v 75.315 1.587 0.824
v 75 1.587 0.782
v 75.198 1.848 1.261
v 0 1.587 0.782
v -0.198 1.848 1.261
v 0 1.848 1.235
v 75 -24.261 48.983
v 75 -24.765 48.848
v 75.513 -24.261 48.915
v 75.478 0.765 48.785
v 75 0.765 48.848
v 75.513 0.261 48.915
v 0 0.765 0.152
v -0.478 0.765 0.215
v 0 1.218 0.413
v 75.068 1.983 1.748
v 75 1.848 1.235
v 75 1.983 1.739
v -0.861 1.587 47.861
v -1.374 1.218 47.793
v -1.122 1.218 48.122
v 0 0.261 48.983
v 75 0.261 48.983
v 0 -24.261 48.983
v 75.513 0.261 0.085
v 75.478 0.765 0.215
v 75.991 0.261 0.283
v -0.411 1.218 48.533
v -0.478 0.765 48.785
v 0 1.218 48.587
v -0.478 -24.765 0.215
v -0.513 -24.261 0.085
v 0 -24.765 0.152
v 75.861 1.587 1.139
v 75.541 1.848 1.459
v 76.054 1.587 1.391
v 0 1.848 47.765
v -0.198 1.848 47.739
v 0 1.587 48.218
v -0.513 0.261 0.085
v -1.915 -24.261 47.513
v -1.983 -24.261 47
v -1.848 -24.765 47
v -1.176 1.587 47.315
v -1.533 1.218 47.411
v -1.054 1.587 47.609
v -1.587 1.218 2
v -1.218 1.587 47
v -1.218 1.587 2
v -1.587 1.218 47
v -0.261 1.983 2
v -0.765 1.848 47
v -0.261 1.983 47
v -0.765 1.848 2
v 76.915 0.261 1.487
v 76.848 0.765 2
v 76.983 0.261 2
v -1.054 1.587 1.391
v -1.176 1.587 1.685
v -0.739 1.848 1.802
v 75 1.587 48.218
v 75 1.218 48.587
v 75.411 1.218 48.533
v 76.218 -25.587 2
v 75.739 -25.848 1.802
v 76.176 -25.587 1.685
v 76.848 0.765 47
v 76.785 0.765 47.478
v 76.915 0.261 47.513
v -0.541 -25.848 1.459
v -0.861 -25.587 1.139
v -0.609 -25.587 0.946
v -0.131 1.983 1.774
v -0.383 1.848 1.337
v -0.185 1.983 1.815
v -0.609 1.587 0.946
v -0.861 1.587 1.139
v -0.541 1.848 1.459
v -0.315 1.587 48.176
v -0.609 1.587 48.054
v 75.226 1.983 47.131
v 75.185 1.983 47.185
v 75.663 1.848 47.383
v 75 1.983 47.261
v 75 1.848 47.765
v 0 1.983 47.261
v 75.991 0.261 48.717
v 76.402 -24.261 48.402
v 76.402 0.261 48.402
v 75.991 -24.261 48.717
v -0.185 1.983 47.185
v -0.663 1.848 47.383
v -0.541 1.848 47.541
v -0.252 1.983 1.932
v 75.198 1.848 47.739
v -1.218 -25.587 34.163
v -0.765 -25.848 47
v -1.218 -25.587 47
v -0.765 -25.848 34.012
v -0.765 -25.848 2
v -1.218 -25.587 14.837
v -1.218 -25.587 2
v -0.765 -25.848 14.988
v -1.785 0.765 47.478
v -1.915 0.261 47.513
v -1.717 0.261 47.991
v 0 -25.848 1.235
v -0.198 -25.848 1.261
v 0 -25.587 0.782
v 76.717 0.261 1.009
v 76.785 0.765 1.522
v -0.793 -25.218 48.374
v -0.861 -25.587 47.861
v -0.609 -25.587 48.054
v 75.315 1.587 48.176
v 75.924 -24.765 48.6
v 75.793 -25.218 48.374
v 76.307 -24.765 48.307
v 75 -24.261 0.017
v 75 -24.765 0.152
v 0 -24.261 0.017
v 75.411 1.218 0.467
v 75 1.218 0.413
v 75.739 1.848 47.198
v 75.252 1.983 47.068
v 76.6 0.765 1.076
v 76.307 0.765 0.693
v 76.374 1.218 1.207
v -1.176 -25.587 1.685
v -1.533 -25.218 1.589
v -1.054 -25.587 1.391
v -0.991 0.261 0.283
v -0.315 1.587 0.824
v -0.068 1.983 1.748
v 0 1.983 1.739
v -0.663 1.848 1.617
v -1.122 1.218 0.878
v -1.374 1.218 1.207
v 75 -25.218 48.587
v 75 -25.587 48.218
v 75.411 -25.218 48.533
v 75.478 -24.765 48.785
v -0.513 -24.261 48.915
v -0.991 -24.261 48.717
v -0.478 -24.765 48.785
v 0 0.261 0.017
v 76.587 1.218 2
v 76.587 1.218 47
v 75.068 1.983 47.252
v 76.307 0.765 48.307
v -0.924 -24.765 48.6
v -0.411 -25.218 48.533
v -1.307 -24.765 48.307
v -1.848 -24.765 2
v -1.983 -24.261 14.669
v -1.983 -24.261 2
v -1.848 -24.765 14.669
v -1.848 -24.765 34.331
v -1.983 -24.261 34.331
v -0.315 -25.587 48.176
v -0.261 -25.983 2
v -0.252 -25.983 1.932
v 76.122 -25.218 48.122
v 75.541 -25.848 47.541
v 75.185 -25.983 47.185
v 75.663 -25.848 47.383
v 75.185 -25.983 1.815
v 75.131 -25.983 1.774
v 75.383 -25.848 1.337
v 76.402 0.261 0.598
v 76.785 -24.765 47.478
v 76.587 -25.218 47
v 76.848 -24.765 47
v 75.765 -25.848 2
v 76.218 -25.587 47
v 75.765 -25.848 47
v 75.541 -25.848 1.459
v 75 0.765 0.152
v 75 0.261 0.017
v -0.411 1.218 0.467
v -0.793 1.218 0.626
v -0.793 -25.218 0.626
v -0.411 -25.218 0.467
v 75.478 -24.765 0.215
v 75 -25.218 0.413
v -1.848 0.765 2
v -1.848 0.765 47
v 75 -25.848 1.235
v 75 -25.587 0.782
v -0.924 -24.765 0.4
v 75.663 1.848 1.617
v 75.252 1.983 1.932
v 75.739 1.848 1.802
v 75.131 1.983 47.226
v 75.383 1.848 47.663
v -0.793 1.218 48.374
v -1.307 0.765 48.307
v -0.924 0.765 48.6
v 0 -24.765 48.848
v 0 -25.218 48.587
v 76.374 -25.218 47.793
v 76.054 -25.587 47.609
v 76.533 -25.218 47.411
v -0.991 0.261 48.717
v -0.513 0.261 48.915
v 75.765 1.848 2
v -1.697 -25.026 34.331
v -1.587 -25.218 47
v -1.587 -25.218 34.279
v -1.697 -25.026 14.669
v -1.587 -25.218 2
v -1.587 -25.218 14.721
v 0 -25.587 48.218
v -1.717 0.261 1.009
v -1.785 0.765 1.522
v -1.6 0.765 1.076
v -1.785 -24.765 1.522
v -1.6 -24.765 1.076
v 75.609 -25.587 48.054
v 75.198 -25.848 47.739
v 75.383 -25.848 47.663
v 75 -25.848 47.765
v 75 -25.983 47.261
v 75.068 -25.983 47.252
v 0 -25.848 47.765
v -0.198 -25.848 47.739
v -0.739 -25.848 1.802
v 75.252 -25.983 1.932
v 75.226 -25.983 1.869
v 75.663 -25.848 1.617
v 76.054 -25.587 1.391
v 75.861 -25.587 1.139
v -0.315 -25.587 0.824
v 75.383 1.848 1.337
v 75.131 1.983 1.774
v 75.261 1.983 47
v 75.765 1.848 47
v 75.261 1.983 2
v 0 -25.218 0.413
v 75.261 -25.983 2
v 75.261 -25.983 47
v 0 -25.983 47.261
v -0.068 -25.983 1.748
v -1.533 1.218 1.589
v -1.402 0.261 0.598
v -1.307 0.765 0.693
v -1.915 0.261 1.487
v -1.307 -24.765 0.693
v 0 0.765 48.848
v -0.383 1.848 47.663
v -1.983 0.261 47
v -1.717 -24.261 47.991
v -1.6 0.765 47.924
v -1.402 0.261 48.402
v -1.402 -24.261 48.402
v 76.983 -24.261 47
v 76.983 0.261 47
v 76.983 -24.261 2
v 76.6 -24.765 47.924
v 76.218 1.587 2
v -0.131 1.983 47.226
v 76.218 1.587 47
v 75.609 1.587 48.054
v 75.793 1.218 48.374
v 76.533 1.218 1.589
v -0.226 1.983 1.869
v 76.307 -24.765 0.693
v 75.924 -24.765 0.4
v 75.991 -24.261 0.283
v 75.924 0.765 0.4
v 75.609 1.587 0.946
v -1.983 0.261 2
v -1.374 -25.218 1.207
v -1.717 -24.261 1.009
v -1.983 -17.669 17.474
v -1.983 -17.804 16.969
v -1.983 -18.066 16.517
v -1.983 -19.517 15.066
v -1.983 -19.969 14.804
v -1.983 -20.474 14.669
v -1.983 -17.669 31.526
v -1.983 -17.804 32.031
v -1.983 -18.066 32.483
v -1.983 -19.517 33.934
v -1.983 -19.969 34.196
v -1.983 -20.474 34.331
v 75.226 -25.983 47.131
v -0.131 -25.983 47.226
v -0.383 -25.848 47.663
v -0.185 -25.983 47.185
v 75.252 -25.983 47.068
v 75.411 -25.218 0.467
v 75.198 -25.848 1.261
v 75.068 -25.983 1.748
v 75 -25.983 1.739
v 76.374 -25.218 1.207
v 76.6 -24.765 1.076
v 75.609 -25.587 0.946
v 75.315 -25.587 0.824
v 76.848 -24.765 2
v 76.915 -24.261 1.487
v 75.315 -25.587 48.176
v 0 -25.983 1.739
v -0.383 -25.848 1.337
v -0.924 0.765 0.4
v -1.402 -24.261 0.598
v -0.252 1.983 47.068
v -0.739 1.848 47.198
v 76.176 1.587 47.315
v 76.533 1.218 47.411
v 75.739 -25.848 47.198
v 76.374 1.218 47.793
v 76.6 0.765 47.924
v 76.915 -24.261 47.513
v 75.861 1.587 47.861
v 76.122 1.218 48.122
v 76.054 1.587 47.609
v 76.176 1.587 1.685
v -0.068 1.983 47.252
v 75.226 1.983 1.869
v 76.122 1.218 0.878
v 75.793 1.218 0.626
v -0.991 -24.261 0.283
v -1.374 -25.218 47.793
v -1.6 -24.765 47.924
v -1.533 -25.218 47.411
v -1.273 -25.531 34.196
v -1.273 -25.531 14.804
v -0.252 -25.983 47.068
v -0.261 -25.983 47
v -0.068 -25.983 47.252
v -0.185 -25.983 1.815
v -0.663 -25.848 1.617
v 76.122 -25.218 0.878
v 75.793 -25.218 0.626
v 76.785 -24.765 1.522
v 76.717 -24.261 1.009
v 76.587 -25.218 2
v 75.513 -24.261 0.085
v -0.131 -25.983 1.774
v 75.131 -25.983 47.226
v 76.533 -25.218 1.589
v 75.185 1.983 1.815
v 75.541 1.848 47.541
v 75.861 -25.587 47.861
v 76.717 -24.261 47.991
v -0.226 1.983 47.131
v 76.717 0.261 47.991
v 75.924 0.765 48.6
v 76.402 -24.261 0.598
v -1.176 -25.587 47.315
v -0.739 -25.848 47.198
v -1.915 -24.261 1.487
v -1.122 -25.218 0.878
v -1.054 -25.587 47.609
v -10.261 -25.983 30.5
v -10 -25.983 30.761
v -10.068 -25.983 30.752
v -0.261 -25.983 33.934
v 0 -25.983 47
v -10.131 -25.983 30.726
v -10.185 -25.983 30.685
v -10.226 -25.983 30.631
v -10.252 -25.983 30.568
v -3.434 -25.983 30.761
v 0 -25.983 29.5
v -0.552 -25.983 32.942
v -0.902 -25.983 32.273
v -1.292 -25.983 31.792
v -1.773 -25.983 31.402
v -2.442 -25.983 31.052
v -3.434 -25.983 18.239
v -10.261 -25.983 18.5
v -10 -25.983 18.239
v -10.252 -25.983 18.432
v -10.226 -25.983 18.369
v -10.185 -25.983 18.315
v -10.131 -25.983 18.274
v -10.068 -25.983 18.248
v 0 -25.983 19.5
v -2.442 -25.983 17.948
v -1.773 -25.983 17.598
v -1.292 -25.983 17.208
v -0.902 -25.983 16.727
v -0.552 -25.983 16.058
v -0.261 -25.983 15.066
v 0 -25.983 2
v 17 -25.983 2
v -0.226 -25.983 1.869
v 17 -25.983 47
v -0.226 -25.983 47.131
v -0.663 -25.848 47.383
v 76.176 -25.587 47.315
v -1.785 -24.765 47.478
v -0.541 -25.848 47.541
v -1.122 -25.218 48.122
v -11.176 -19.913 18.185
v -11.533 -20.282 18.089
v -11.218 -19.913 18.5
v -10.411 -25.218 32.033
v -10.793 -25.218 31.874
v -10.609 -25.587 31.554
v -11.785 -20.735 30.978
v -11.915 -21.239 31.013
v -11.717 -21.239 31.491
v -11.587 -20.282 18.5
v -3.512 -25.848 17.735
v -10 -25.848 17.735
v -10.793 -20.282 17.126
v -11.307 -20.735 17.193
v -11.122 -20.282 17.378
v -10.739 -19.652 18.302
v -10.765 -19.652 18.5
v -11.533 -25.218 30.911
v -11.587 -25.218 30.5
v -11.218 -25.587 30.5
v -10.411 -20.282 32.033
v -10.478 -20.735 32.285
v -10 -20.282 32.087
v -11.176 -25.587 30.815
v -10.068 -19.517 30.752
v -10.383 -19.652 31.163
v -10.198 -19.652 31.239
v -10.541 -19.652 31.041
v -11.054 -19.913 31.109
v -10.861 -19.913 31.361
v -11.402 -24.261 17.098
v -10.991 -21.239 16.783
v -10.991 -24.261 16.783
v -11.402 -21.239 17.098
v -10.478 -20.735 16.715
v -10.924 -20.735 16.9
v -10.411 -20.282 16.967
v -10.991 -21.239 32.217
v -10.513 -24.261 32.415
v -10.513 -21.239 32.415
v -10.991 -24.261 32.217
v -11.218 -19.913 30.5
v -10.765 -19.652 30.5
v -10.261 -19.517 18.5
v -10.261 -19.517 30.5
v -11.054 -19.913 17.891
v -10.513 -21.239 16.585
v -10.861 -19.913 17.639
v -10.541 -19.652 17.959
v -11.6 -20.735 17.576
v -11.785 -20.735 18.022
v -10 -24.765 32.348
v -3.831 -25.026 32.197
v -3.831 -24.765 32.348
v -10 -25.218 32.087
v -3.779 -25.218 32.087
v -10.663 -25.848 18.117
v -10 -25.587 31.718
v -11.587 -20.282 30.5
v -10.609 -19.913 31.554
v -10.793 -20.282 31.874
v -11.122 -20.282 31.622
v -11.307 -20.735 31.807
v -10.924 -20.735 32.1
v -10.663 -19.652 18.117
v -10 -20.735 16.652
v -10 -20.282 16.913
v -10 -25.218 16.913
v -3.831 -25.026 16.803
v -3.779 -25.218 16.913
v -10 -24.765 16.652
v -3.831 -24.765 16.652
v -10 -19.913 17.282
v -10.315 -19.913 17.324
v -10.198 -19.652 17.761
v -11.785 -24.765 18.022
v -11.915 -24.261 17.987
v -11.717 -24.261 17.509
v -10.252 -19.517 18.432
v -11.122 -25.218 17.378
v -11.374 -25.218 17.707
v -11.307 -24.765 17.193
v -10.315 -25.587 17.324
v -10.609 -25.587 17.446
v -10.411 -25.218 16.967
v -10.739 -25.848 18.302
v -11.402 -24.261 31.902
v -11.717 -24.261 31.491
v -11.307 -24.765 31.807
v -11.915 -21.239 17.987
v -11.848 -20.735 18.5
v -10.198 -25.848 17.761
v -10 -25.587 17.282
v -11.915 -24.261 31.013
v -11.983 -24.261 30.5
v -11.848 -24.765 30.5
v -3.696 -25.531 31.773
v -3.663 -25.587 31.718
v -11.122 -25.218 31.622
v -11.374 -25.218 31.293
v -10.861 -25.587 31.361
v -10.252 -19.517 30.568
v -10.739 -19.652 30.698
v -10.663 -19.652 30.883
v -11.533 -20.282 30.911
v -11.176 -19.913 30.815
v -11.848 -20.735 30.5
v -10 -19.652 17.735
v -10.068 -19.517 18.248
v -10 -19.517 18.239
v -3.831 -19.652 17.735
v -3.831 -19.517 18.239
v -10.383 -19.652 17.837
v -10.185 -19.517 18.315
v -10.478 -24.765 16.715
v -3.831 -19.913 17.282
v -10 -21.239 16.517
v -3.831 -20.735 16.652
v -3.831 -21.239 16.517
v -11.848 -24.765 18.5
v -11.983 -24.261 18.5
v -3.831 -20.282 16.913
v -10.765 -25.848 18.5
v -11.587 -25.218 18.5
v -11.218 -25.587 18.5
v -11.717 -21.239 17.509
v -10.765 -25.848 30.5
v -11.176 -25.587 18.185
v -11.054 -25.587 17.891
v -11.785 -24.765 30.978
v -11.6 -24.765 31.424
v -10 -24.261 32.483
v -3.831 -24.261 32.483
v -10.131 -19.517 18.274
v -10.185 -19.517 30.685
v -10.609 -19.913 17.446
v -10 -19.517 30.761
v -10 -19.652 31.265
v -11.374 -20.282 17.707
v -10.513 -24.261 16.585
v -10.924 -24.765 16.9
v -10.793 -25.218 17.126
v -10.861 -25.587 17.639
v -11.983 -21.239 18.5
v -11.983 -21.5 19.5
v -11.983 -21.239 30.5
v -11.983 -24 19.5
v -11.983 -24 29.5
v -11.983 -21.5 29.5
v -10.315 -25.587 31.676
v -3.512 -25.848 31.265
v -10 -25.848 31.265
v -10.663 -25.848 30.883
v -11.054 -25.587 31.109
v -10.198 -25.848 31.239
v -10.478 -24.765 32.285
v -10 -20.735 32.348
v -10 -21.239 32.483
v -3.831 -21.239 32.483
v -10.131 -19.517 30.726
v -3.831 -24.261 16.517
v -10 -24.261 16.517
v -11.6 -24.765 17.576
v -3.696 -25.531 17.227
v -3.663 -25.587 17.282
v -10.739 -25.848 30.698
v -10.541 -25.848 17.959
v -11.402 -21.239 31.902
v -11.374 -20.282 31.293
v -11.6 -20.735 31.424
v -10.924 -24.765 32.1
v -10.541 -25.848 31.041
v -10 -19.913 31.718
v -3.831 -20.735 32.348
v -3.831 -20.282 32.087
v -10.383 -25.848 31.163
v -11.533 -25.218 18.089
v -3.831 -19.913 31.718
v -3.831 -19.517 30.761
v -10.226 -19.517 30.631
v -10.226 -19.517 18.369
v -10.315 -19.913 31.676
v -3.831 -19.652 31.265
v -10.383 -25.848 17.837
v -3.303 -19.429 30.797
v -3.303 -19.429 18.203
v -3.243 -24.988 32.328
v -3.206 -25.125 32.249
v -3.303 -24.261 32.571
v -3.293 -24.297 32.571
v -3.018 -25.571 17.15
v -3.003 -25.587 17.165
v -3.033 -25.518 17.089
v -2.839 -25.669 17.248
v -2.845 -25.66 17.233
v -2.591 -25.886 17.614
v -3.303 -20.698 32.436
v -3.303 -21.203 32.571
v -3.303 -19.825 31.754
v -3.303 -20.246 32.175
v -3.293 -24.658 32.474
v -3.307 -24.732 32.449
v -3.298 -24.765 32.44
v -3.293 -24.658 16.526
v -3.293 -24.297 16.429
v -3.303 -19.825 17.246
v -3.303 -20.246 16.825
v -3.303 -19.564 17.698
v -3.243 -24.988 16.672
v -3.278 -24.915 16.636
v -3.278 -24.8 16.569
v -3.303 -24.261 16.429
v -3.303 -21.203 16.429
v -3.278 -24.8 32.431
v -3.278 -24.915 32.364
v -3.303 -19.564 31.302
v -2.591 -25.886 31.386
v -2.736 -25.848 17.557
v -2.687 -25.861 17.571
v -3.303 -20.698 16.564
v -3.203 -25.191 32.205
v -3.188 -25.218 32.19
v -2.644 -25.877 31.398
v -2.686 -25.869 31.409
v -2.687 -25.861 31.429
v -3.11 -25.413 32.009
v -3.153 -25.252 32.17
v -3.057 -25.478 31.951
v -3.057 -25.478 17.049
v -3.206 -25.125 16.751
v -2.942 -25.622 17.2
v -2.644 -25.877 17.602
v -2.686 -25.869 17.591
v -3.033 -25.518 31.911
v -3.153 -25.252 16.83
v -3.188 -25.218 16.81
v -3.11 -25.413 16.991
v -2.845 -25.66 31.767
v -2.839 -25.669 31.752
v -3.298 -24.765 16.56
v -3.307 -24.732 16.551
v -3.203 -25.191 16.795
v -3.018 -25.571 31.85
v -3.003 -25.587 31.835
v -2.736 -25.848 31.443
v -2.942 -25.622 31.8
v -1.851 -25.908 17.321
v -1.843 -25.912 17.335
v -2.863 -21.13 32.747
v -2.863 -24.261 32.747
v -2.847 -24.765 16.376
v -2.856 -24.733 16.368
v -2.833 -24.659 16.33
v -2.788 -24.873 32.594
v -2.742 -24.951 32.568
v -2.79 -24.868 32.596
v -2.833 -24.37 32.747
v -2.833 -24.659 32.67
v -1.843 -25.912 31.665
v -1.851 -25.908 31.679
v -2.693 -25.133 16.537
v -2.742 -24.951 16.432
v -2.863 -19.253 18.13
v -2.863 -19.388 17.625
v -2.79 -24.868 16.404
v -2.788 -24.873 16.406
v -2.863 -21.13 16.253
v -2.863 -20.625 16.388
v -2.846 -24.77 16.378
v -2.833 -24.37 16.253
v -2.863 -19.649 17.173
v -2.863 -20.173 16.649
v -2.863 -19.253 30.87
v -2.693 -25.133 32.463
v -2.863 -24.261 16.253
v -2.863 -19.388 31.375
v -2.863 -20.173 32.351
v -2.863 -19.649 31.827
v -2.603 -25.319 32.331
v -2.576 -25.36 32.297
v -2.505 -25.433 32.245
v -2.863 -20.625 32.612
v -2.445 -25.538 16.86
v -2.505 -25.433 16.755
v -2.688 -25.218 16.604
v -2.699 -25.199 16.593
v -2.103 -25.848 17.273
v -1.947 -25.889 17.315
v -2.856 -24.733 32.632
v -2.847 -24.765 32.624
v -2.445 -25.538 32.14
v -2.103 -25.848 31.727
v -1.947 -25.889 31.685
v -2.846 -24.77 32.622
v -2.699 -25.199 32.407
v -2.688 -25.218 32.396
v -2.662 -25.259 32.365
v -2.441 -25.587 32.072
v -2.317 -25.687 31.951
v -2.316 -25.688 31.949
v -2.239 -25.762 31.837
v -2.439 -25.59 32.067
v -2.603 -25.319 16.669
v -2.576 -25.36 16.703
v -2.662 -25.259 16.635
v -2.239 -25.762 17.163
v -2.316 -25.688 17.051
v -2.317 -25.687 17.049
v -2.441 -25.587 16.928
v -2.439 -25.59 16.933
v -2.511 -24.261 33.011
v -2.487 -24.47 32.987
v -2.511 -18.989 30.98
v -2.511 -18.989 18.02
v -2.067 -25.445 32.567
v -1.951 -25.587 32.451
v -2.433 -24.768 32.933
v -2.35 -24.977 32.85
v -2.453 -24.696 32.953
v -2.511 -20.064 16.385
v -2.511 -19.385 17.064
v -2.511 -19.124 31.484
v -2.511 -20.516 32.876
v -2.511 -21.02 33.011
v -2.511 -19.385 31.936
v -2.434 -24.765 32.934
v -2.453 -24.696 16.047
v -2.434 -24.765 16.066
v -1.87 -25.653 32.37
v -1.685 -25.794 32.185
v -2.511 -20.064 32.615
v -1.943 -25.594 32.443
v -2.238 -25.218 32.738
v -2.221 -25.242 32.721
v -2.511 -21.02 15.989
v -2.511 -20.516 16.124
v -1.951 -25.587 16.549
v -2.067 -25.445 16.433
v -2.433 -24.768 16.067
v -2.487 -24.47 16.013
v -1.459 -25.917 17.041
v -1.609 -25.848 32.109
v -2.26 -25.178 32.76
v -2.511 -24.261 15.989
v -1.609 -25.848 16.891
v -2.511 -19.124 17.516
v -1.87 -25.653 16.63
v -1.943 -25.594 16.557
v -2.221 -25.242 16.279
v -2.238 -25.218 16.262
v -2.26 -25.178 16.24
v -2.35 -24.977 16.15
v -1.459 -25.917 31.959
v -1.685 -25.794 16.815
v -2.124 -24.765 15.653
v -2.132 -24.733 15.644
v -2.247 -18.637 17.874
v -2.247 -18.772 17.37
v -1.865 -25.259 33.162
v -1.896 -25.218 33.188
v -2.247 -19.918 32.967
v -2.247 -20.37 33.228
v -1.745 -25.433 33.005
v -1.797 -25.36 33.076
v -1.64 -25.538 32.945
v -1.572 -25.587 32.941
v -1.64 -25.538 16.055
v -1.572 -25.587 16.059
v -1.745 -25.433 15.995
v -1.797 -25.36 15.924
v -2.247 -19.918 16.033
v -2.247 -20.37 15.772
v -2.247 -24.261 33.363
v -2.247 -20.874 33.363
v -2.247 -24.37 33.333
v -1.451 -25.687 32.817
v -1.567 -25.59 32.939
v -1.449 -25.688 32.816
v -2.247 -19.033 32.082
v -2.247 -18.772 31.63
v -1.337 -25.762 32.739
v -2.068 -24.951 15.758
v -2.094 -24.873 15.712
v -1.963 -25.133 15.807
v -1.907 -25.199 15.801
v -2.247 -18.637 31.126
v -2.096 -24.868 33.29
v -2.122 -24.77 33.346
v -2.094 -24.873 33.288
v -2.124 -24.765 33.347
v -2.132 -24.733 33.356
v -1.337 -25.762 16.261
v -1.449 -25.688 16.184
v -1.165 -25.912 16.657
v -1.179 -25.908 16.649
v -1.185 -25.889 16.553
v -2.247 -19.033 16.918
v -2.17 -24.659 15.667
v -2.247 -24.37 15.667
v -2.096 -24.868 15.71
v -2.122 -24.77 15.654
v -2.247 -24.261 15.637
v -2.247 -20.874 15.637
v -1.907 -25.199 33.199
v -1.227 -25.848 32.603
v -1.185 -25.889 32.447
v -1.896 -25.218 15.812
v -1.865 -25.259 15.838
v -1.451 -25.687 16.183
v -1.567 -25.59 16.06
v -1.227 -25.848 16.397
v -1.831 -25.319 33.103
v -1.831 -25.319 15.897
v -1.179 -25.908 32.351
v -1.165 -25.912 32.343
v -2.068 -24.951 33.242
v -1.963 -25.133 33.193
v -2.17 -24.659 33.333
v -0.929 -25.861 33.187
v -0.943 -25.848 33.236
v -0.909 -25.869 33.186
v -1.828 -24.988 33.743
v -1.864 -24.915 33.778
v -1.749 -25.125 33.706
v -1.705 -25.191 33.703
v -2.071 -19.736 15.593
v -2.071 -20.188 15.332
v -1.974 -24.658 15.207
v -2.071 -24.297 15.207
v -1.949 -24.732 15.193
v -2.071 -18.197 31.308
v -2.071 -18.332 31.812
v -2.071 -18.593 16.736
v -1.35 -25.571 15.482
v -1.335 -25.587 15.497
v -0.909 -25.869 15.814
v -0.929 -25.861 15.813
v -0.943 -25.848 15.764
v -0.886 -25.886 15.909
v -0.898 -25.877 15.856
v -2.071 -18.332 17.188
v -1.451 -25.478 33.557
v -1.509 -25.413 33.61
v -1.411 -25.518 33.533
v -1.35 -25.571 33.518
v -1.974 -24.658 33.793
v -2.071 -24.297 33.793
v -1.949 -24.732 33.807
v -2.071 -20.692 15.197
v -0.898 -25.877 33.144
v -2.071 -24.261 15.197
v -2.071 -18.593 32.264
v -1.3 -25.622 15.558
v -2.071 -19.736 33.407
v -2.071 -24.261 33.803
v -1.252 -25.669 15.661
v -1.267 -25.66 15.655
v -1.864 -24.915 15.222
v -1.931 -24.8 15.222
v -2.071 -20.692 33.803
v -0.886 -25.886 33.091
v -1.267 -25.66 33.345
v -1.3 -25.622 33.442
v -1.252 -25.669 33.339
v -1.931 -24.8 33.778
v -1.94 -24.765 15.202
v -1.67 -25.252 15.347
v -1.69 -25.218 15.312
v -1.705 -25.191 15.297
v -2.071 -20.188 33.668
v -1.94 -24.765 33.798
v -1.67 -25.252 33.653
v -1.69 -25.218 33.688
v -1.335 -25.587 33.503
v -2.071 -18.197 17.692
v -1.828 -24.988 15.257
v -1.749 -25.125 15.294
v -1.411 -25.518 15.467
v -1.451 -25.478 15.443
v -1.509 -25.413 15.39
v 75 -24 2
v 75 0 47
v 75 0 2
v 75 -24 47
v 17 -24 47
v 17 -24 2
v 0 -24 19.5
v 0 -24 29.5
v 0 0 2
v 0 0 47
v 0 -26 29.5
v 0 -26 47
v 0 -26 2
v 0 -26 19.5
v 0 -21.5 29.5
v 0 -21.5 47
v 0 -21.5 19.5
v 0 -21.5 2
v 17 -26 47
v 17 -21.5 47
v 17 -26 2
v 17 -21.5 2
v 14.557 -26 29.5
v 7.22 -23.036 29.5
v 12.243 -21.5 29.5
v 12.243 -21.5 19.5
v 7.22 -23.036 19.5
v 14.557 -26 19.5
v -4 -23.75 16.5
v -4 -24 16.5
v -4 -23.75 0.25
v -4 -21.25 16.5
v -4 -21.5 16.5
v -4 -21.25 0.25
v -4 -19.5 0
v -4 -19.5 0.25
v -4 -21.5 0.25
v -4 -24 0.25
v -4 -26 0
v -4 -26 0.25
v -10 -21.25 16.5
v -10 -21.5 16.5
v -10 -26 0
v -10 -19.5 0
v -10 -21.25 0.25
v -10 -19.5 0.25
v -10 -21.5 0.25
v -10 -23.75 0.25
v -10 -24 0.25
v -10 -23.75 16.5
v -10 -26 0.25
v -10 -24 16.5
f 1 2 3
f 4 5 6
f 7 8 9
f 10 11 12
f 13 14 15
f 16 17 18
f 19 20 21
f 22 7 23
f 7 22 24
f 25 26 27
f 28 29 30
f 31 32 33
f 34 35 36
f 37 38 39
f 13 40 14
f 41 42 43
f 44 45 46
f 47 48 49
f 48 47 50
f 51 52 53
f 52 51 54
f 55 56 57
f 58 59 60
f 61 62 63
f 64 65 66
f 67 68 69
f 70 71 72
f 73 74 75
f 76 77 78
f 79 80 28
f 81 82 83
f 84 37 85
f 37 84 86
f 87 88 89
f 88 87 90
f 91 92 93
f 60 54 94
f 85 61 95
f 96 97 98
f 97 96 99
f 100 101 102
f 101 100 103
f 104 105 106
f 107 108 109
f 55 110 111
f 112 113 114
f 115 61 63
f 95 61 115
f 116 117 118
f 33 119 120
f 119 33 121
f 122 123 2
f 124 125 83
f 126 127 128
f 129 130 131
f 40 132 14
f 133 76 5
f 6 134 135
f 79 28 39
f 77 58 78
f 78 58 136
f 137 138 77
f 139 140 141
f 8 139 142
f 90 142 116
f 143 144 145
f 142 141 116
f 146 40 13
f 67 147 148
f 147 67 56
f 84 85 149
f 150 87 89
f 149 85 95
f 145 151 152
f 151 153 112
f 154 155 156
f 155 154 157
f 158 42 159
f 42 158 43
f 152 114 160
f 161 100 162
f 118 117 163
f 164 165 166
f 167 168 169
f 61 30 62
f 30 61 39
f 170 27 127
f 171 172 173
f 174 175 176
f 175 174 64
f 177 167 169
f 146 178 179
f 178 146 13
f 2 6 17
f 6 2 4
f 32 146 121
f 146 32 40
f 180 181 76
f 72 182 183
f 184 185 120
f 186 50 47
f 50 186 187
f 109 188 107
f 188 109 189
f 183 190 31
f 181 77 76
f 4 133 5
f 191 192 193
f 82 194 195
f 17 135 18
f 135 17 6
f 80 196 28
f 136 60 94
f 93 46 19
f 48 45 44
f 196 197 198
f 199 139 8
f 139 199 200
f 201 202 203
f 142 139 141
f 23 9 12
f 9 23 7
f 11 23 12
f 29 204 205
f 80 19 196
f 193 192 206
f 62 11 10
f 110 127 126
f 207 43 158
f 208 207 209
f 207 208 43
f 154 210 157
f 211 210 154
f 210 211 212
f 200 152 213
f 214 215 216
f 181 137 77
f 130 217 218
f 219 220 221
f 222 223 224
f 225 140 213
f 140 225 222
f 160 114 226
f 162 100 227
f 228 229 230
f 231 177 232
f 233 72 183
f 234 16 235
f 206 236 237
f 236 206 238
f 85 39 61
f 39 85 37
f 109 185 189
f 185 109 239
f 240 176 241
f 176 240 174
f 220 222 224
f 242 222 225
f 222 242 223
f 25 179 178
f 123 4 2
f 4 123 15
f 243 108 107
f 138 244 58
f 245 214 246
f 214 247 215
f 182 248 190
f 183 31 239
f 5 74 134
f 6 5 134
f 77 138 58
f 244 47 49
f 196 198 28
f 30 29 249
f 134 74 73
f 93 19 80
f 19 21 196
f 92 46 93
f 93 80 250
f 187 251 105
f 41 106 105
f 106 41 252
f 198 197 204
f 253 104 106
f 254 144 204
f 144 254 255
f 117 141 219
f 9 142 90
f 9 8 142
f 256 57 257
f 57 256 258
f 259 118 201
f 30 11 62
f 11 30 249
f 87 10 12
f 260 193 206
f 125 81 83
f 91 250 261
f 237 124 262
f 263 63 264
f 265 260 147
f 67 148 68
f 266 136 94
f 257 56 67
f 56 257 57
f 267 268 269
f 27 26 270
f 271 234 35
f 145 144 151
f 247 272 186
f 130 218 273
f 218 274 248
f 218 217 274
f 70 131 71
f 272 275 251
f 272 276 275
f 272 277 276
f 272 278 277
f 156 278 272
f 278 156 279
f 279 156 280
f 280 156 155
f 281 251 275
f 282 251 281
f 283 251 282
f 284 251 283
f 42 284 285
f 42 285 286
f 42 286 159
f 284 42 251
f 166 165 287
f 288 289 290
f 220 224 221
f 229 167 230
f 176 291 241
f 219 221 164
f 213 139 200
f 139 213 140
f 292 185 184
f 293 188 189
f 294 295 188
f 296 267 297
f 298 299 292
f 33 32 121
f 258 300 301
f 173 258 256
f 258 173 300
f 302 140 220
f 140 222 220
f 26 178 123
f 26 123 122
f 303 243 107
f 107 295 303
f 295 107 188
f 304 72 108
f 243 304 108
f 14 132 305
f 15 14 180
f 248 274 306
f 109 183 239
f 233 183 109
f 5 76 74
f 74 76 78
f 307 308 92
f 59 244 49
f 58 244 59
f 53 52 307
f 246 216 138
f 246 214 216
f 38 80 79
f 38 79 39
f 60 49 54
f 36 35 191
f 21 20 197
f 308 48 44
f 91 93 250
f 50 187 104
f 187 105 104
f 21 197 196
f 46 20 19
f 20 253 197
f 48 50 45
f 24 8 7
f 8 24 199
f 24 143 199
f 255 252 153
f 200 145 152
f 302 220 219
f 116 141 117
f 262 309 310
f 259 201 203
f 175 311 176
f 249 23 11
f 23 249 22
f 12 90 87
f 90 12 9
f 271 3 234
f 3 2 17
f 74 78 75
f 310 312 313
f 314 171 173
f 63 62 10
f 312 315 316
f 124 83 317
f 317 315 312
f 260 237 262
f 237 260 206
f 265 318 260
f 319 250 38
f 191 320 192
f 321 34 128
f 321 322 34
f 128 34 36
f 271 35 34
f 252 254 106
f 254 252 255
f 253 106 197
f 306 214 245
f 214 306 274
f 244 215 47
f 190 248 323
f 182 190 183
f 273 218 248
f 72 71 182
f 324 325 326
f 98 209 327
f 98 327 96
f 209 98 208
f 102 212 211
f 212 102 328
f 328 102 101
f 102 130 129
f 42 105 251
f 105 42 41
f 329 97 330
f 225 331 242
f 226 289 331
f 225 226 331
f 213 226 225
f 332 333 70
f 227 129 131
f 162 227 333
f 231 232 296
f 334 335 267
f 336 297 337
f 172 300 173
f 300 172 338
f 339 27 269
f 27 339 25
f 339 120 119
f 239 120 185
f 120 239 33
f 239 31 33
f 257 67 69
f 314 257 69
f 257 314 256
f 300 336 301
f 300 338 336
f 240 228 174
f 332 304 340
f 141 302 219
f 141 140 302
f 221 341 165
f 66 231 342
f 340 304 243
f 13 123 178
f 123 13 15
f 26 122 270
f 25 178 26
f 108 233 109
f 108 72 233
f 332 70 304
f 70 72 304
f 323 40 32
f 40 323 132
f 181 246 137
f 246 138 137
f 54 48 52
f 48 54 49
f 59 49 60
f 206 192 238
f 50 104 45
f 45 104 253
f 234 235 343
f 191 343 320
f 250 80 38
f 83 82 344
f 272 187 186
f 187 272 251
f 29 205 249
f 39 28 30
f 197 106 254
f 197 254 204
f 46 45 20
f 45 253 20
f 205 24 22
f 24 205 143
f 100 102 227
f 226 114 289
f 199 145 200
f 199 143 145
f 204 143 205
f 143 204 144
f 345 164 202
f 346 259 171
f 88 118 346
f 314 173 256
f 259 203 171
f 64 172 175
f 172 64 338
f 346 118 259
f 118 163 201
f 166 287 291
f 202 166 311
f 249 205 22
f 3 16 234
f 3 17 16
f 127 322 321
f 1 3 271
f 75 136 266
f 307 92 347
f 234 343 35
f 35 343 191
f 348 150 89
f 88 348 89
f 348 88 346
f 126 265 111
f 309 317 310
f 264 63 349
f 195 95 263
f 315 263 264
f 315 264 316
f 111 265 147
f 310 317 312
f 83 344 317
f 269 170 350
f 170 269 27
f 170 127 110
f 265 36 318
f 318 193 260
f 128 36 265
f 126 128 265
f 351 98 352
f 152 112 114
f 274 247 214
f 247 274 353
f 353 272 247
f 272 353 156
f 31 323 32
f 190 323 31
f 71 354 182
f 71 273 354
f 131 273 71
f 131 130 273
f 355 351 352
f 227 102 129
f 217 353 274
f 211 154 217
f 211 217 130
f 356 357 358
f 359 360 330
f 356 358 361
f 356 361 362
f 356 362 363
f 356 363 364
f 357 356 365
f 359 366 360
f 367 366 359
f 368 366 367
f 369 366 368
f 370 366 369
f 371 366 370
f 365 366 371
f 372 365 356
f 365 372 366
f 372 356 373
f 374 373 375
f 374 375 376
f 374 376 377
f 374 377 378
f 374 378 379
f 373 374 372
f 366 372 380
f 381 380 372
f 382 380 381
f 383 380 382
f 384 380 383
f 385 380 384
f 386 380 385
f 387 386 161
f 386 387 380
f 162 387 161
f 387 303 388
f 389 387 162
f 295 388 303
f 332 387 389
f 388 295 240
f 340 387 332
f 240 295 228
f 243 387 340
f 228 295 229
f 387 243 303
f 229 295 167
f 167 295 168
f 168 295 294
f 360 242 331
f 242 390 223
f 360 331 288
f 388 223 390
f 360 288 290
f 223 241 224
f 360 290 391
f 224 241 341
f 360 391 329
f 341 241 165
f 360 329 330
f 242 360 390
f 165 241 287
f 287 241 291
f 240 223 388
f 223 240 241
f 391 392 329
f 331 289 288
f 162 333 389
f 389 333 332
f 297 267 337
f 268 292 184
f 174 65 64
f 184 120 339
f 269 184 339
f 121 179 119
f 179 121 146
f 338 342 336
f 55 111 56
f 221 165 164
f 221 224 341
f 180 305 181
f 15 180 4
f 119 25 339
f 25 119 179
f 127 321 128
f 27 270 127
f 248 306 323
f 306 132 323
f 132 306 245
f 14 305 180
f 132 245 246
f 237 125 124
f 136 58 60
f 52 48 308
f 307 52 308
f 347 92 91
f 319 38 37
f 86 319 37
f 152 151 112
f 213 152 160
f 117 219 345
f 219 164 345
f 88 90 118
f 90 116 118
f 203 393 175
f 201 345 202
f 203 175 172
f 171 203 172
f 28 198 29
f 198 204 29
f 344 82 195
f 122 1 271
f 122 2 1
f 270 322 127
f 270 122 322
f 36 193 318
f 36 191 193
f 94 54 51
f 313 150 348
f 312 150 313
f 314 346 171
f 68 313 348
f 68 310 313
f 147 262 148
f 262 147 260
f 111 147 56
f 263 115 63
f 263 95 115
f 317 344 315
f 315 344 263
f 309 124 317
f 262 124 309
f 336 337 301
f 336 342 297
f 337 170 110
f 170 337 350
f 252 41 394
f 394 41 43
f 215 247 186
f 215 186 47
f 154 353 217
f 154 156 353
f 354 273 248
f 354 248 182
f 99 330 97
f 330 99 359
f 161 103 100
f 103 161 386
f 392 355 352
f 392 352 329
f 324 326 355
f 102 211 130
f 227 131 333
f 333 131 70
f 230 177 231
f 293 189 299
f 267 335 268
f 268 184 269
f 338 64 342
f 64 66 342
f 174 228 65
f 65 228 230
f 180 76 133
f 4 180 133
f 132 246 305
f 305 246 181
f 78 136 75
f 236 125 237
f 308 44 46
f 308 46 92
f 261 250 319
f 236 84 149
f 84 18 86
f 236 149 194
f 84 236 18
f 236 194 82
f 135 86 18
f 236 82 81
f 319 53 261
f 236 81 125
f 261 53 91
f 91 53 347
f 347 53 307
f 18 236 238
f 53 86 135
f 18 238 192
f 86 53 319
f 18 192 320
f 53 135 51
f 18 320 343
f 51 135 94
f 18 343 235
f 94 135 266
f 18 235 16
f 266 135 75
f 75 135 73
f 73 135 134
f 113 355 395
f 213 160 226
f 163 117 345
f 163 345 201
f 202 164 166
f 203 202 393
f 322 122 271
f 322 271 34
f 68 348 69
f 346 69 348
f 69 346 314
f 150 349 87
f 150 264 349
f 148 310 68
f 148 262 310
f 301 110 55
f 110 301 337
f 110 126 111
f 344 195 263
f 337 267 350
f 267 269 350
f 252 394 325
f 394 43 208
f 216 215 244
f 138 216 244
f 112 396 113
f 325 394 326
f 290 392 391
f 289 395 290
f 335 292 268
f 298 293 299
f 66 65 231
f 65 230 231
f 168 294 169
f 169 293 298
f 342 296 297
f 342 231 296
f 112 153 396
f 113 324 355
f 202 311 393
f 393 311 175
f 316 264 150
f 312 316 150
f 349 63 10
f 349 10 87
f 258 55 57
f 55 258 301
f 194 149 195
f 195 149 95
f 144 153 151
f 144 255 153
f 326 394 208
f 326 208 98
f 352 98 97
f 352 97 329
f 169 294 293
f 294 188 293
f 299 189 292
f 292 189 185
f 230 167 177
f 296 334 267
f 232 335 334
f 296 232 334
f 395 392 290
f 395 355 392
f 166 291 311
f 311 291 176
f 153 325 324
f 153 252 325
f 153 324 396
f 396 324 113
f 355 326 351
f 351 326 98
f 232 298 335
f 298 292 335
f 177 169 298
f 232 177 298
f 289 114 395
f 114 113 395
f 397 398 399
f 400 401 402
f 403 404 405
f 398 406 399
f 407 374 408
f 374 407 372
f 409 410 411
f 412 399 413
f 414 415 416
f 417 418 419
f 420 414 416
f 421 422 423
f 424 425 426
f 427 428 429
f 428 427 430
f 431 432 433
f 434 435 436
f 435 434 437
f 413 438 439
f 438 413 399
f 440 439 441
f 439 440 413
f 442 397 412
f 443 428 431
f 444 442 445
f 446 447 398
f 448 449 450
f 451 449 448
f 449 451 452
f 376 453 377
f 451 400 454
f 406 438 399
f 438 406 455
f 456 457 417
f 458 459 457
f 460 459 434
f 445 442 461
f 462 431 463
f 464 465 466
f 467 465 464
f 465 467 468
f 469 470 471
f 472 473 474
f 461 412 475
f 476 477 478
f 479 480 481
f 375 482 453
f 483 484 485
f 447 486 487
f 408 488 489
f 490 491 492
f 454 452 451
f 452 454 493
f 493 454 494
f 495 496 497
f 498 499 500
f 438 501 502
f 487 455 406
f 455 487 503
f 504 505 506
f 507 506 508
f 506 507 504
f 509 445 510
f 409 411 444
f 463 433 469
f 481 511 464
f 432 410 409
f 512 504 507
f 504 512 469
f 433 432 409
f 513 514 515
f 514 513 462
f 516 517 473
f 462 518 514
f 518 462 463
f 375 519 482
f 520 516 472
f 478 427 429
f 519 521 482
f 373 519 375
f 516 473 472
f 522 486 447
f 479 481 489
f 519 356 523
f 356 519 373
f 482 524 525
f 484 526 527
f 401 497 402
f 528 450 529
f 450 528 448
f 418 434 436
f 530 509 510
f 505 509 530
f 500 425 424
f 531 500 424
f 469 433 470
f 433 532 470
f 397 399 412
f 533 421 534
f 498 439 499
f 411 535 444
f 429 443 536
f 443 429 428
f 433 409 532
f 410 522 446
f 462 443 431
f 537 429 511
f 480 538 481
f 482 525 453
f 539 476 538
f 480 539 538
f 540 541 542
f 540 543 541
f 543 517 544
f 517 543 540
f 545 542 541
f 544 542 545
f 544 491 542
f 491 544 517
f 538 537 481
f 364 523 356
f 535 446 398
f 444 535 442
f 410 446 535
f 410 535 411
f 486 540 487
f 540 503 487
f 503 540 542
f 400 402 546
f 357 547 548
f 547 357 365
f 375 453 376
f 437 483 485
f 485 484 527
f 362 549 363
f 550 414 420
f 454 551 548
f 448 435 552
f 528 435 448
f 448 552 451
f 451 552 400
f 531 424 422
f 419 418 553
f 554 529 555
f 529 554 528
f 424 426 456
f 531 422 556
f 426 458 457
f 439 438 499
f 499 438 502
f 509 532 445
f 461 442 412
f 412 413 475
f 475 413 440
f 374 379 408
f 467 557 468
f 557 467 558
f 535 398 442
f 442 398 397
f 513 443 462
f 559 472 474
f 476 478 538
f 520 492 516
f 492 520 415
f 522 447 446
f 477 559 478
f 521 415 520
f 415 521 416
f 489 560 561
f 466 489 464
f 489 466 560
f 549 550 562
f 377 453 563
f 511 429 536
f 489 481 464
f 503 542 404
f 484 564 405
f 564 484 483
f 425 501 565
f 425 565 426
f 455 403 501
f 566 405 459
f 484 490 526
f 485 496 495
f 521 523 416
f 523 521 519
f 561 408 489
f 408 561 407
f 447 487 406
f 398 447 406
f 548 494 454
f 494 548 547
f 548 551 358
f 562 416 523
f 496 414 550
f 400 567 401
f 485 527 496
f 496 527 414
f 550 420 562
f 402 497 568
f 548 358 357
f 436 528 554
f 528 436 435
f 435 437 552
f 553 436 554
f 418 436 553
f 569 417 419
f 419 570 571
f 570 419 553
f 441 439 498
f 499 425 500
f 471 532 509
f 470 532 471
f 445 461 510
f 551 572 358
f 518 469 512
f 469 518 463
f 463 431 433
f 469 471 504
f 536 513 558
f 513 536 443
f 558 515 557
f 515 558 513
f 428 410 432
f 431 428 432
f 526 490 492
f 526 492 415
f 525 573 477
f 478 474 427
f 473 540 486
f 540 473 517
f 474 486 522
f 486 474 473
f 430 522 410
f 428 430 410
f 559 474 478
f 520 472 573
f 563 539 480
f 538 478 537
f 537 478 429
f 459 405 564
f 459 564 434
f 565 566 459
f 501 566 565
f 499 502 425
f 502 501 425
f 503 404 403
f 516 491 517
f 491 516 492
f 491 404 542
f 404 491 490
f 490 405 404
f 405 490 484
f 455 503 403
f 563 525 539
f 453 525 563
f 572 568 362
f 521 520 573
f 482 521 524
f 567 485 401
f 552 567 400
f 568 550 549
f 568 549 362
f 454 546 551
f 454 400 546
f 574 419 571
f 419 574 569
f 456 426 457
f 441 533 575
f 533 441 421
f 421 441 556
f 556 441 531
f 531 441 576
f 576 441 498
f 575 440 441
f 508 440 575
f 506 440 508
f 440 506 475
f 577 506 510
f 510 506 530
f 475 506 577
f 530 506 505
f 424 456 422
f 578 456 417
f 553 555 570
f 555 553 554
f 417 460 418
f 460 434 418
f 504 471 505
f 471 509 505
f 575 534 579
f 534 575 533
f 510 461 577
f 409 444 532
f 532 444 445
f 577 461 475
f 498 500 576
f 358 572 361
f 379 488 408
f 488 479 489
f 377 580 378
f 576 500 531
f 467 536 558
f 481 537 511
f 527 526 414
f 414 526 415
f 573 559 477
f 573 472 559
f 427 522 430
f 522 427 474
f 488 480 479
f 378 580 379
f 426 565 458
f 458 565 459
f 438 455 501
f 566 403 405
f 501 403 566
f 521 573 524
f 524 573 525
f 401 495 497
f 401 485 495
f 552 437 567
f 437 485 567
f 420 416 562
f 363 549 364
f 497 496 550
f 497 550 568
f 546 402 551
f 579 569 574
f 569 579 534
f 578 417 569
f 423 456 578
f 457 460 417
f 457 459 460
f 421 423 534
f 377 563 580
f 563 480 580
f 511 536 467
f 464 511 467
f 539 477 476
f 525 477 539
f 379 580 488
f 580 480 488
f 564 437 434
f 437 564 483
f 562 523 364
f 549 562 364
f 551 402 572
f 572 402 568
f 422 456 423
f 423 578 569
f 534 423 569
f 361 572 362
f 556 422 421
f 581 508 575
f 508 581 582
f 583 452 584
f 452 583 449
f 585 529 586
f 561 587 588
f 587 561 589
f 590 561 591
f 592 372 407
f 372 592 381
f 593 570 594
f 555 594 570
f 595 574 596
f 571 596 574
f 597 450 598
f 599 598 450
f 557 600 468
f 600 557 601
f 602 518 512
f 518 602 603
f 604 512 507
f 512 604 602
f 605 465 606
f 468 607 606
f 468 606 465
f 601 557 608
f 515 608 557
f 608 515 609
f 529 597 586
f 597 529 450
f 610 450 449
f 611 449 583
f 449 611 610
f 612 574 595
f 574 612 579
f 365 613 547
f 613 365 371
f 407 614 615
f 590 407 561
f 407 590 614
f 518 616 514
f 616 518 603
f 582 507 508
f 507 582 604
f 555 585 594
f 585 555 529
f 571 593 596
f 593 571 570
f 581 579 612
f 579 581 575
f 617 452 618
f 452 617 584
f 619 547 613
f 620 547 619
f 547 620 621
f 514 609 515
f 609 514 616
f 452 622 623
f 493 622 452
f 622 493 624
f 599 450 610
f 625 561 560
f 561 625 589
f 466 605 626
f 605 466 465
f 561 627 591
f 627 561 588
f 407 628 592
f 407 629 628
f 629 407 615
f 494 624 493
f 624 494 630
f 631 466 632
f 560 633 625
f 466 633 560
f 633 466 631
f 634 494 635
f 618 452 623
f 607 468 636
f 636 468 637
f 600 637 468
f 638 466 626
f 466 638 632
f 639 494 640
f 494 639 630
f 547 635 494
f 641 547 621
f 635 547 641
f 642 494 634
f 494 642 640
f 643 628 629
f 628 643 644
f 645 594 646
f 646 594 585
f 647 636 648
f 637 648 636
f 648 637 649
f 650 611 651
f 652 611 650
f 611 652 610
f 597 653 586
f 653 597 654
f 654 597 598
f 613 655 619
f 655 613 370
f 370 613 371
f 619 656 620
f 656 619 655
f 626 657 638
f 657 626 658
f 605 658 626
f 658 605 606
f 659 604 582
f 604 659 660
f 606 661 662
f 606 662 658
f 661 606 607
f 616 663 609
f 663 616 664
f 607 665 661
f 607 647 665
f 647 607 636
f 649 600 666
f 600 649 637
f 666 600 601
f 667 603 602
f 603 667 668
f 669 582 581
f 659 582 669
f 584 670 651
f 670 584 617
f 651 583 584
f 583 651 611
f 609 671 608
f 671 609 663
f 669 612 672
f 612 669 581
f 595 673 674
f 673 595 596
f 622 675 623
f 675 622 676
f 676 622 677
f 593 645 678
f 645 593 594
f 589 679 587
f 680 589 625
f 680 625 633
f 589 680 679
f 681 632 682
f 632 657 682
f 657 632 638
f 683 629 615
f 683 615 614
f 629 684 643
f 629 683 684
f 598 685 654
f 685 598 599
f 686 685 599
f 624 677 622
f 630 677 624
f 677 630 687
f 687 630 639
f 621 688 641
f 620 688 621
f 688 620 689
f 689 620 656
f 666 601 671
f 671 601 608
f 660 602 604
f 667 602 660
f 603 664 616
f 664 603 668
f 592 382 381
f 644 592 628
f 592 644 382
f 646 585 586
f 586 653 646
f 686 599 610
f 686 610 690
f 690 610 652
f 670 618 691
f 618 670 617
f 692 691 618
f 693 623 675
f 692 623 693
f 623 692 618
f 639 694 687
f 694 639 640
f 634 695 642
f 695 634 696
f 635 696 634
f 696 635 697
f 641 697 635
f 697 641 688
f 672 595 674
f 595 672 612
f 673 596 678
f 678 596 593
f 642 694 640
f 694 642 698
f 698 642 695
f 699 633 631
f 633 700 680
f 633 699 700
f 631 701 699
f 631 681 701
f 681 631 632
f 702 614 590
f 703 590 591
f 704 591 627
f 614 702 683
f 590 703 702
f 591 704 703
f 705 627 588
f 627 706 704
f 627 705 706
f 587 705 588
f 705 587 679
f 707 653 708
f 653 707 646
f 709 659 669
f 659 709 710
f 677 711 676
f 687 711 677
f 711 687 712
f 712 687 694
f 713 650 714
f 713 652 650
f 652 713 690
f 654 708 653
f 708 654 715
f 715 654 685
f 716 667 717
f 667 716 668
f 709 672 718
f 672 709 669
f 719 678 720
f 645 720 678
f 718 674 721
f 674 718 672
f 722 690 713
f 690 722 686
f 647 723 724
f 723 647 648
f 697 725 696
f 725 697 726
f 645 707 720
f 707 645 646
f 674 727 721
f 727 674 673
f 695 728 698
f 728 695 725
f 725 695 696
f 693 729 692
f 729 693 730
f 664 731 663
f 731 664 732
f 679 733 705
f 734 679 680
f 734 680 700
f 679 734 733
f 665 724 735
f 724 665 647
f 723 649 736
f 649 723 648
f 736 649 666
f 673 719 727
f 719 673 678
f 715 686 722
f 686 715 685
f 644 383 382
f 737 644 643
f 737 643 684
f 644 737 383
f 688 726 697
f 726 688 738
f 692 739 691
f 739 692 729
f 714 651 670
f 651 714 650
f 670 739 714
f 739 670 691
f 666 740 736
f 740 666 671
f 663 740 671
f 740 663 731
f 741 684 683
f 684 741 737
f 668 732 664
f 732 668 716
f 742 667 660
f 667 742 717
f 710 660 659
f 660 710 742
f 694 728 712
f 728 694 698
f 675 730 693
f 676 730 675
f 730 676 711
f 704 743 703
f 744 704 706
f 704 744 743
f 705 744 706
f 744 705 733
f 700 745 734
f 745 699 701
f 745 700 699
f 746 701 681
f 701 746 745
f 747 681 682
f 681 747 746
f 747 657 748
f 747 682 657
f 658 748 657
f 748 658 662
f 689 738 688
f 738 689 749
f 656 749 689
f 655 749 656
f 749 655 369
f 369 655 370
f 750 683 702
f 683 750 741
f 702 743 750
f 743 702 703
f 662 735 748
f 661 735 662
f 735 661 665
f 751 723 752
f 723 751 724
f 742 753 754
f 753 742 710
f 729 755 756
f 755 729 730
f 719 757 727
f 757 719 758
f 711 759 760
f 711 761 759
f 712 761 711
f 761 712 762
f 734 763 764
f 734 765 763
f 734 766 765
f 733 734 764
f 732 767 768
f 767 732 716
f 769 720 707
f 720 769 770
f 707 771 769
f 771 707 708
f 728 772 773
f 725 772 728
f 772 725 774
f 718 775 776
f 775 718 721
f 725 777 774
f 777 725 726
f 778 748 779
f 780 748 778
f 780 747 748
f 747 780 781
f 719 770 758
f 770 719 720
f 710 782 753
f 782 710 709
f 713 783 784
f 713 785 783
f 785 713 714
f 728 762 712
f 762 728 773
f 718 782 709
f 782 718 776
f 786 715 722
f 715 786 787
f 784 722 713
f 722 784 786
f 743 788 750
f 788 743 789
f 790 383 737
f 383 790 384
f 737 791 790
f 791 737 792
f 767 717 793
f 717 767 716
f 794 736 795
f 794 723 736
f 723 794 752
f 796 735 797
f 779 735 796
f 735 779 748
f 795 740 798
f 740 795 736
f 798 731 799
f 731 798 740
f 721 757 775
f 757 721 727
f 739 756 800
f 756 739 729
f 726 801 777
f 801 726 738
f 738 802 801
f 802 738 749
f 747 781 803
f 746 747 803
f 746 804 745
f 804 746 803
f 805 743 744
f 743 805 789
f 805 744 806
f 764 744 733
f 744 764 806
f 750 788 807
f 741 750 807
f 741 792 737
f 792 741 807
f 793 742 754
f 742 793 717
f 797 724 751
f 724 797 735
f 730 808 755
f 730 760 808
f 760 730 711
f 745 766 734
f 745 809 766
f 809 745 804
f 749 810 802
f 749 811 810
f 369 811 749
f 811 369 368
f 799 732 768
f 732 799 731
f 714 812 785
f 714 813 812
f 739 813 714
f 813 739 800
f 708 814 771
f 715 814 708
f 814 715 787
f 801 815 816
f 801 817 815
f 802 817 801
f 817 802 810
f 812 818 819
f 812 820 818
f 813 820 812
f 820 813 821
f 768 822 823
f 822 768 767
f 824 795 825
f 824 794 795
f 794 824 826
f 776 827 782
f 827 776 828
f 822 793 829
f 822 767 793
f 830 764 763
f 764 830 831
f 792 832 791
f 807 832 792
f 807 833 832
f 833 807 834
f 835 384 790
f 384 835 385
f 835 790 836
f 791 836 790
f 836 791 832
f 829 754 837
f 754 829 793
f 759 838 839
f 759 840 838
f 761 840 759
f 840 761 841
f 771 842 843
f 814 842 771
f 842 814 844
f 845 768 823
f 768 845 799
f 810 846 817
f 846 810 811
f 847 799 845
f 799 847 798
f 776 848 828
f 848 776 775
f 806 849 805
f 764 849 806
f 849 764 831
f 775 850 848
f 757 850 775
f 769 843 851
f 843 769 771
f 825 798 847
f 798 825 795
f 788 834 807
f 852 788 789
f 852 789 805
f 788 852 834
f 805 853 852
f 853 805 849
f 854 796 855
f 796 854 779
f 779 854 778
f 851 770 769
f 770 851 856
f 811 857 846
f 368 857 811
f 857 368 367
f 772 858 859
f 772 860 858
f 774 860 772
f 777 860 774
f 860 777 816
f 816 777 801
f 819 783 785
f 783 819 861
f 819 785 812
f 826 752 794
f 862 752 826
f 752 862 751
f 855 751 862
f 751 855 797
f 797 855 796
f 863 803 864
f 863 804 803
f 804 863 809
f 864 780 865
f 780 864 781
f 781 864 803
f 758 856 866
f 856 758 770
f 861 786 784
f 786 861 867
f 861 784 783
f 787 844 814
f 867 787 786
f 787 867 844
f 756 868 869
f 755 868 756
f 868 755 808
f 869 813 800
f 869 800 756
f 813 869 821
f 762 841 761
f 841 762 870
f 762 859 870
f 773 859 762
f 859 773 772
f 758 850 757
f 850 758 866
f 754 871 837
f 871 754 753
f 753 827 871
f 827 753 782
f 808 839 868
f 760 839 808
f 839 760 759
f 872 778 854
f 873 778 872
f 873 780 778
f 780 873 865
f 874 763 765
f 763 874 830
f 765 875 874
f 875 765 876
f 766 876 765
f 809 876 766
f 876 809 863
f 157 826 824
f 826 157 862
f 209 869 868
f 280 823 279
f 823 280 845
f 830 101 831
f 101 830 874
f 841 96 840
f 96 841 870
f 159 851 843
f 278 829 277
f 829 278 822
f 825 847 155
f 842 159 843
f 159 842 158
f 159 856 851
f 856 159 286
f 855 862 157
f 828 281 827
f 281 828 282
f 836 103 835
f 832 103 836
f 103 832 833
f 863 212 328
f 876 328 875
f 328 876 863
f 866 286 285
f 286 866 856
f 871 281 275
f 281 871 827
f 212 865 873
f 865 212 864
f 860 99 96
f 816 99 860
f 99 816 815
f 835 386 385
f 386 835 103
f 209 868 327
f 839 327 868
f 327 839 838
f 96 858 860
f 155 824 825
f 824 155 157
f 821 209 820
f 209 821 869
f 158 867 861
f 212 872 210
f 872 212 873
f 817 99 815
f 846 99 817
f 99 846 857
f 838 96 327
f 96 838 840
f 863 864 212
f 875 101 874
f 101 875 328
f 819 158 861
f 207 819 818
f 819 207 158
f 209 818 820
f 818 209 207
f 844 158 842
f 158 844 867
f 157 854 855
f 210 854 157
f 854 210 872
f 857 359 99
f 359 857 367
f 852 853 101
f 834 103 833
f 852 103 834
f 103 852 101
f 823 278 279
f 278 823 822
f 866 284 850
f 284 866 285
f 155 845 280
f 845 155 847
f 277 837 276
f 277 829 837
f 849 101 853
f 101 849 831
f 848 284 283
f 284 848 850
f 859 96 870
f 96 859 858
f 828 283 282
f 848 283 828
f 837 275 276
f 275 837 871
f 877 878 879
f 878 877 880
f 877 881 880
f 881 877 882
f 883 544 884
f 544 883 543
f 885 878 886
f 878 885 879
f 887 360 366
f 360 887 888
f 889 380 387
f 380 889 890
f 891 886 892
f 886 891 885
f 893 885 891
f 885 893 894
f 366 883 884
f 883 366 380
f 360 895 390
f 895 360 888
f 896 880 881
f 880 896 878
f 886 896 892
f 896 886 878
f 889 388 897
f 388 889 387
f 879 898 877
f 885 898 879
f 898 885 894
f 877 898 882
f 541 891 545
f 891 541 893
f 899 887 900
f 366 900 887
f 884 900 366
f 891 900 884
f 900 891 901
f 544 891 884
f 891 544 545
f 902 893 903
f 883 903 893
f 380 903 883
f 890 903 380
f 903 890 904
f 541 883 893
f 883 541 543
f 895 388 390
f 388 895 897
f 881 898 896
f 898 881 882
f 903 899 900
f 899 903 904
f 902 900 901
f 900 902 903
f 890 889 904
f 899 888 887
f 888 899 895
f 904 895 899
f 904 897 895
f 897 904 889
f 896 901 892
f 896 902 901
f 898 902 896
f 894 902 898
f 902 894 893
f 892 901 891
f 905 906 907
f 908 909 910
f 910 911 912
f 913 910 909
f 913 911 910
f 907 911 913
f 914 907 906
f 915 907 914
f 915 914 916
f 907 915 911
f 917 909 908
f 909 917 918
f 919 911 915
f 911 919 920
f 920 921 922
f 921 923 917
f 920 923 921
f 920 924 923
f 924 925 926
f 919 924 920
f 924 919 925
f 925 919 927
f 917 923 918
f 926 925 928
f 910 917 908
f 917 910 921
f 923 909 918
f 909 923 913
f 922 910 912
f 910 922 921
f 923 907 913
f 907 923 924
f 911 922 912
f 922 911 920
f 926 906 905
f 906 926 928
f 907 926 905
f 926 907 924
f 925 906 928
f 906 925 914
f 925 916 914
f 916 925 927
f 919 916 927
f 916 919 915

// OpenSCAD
// file: fillet.scad
// Fillet function
/*
$fn = 24;
fillet(r=2,steps=5) {
	cylinder(r=5,h=10);
	cube([10,10,2]);
	rotate([30,30,30]) cylinder(r=1.0,h=50,center=true);
}
*/

module fillet(r=1.0,steps=3,include=true) {
  if(include) for (k=[0:$children-1]) {
	children(k);
  }
  for (i=[0:$children-2] ) {
    for(j=[i+1:$children-1] ) {
	fillet_two(r=r,steps=steps) {
	  children(i);
	  children(j);
	  intersection() {
		children(i);
		children(j);
	  }
	}
    }
  }
}

module fillet_two(r=1.0,steps=3) {
  for(step=[1:steps]) {
	hull() {
	  render() intersection() {
		children(0);
		offset_3d(r=r*step/steps) children(2);
	  }
	  render() intersection() {
		children(1);
		offset_3d(r=r*(steps-step+1)/steps) children(2);
	  }
	}
  }
}

module offset_3d(r=1.0) {
  for(k=[0:$children-1]) minkowski() {
	children(k);
	sphere(r=r,$fn=8);
  }
}
// main file
use <fillet.scad>

$fn = 24;  

//length = 65;
//width = 45;
//height = 25;
rounding_radius = 2;
top_thinckness = 0;

mouthpiece_size = [10, 12, 2.5];

ww_length = mouthpiece_size[0] + 9;
ww_width  = mouthpiece_size[1] - 2;
ww_height = mouthpiece_size[2];

fi_length = mouthpiece_size[0] + 7;
fi_width  = mouthpiece_size[1] - 2;
fi_height = mouthpiece_size[2];
fi_inset = 4;

// Uncomment basic or supported version
//whistle(75, 45, 24);

//add_supports_at_45(75, 45, 24) {
//    whistle(75, 45, 24);
//}
    
add_supports_at_90(75, 45, 24) {
    whistle(75, 45, 24, debug=false);
}


// A hollow box with a windway and fipple
module whistle(length, width, height, debug=false) {
    
    difference() {
        body(length, width, height);
        if(debug) {
            cube([length, width+10, height-top_thinckness]); // main interior
        }
        else {
            cube([length, width, height-top_thinckness]); // main         
        }
        // Cutout Windway
        translate([
            -(mouthpiece_size[0]+rounding_radius+1), 
            (width - ww_width)/2, 
            height - ww_height
        ]) 
            cube([ww_length, ww_width, ww_height]);
        
        // Cutout for fipple block
        fipple_block(width, height);
    }
    
    // form fipple as a seperate piece
    fipple(width, height);
}


module fipple_block(w, h) {
    translate([0, 0, h - fi_height])
        cube([fi_length, w, fi_height + rounding_radius]);
}


module fipple(w, h) {
    // Still some magic numbers here for tweeking fipple size
    difference (){
        fipple_block(w, h);
        translate([2.8, (w - fi_width)/2, h - 2.75]) {
            rotate([0,-22,0])
                cube([18, fi_width, 6]); // fipple - top cut
            rotate([0,17,0])
                cube([18, fi_width, 3]); // fipple - inside cut
        }
        // make sure airway is clear
        translate([0, (w - fi_width)/2, h - 2.75])
            cube([5, fi_width, 10]);
    }
}


// A rounded box with a mouthpiece
module body (length, width, height) {
    fillet(r=rounding_radius, steps=$fn/4) {
        // The main body
        rounded_box([length, width, height], rounding_radius);
        
        // The mouthpiece centered and flush with top
        translate([
                -(mouthpiece_size[0]), 
                width/2 - (mouthpiece_size[1])/2, 
                (height - mouthpiece_size[2])
            ]) 
            rounded_box(mouthpiece_size, rounding_radius);
    }
}


module rounded_box(size, radius) {
    minkowski()     {
        cube(size);
        sphere(r=radius);
    }
}


// Change orientation for printing and add support materials
module add_supports_at_90(length, width, height)
{
    z_offset = rounding_radius + height*sqrt(2)/2;
    translate([0, 0, rounding_radius])
        rotate([90,0,0])
            children(0);
    
    // add a t-shaped supports for mouthpiece
    support_position = height-mouthpiece_size[2];
    support_height = (width - mouthpiece_size[1])/2 ;

    t_support_x([-10,-support_position,0], 6, support_height);
    t_support_x([-10,-height,0], 6, support_height);
}


module add_supports_at_45 (length, width, height)
{
    z_offset = rounding_radius + height*sqrt(2)/2;
    translate([0, 0, z_offset])
        rotate([135,0,0])
            children(0);

    // add a t-shaped support for mouthpiece
    support_position = (height+(width-mouthpiece_size[1])/2) * sqrt(2)/2;
    support_height = (width - mouthpiece_size[1])/2 * sqrt(2)/2;
    t_support_x([-10,-support_position,0], 4, support_height);

    // stabilize the body
    t_support_x([0, 6-height*sqrt(2)/2, 0], length, 6);
    t_support_x([0, -6-height*sqrt(2)/2, 0], length, 6);

    // support the upper edge of hole
    fp_z = (width+fi_width+fi_inset)/2*sqrt(2)/2;
    fp_y = -(height*sqrt(2)/2 + (width+fi_width+fi_inset)/2*sqrt(2)/2);
    t_support_x([0, fp_y, 0], fi_length, fp_z);
}


// make a t-shaped support structure along x-axis
module t_support_x(pos, l, h)
{
    translate(pos) {
        cube([l,.25, h]);
        translate([0, -2, 0])
            cube([l, 4,.25]);
    }
}
